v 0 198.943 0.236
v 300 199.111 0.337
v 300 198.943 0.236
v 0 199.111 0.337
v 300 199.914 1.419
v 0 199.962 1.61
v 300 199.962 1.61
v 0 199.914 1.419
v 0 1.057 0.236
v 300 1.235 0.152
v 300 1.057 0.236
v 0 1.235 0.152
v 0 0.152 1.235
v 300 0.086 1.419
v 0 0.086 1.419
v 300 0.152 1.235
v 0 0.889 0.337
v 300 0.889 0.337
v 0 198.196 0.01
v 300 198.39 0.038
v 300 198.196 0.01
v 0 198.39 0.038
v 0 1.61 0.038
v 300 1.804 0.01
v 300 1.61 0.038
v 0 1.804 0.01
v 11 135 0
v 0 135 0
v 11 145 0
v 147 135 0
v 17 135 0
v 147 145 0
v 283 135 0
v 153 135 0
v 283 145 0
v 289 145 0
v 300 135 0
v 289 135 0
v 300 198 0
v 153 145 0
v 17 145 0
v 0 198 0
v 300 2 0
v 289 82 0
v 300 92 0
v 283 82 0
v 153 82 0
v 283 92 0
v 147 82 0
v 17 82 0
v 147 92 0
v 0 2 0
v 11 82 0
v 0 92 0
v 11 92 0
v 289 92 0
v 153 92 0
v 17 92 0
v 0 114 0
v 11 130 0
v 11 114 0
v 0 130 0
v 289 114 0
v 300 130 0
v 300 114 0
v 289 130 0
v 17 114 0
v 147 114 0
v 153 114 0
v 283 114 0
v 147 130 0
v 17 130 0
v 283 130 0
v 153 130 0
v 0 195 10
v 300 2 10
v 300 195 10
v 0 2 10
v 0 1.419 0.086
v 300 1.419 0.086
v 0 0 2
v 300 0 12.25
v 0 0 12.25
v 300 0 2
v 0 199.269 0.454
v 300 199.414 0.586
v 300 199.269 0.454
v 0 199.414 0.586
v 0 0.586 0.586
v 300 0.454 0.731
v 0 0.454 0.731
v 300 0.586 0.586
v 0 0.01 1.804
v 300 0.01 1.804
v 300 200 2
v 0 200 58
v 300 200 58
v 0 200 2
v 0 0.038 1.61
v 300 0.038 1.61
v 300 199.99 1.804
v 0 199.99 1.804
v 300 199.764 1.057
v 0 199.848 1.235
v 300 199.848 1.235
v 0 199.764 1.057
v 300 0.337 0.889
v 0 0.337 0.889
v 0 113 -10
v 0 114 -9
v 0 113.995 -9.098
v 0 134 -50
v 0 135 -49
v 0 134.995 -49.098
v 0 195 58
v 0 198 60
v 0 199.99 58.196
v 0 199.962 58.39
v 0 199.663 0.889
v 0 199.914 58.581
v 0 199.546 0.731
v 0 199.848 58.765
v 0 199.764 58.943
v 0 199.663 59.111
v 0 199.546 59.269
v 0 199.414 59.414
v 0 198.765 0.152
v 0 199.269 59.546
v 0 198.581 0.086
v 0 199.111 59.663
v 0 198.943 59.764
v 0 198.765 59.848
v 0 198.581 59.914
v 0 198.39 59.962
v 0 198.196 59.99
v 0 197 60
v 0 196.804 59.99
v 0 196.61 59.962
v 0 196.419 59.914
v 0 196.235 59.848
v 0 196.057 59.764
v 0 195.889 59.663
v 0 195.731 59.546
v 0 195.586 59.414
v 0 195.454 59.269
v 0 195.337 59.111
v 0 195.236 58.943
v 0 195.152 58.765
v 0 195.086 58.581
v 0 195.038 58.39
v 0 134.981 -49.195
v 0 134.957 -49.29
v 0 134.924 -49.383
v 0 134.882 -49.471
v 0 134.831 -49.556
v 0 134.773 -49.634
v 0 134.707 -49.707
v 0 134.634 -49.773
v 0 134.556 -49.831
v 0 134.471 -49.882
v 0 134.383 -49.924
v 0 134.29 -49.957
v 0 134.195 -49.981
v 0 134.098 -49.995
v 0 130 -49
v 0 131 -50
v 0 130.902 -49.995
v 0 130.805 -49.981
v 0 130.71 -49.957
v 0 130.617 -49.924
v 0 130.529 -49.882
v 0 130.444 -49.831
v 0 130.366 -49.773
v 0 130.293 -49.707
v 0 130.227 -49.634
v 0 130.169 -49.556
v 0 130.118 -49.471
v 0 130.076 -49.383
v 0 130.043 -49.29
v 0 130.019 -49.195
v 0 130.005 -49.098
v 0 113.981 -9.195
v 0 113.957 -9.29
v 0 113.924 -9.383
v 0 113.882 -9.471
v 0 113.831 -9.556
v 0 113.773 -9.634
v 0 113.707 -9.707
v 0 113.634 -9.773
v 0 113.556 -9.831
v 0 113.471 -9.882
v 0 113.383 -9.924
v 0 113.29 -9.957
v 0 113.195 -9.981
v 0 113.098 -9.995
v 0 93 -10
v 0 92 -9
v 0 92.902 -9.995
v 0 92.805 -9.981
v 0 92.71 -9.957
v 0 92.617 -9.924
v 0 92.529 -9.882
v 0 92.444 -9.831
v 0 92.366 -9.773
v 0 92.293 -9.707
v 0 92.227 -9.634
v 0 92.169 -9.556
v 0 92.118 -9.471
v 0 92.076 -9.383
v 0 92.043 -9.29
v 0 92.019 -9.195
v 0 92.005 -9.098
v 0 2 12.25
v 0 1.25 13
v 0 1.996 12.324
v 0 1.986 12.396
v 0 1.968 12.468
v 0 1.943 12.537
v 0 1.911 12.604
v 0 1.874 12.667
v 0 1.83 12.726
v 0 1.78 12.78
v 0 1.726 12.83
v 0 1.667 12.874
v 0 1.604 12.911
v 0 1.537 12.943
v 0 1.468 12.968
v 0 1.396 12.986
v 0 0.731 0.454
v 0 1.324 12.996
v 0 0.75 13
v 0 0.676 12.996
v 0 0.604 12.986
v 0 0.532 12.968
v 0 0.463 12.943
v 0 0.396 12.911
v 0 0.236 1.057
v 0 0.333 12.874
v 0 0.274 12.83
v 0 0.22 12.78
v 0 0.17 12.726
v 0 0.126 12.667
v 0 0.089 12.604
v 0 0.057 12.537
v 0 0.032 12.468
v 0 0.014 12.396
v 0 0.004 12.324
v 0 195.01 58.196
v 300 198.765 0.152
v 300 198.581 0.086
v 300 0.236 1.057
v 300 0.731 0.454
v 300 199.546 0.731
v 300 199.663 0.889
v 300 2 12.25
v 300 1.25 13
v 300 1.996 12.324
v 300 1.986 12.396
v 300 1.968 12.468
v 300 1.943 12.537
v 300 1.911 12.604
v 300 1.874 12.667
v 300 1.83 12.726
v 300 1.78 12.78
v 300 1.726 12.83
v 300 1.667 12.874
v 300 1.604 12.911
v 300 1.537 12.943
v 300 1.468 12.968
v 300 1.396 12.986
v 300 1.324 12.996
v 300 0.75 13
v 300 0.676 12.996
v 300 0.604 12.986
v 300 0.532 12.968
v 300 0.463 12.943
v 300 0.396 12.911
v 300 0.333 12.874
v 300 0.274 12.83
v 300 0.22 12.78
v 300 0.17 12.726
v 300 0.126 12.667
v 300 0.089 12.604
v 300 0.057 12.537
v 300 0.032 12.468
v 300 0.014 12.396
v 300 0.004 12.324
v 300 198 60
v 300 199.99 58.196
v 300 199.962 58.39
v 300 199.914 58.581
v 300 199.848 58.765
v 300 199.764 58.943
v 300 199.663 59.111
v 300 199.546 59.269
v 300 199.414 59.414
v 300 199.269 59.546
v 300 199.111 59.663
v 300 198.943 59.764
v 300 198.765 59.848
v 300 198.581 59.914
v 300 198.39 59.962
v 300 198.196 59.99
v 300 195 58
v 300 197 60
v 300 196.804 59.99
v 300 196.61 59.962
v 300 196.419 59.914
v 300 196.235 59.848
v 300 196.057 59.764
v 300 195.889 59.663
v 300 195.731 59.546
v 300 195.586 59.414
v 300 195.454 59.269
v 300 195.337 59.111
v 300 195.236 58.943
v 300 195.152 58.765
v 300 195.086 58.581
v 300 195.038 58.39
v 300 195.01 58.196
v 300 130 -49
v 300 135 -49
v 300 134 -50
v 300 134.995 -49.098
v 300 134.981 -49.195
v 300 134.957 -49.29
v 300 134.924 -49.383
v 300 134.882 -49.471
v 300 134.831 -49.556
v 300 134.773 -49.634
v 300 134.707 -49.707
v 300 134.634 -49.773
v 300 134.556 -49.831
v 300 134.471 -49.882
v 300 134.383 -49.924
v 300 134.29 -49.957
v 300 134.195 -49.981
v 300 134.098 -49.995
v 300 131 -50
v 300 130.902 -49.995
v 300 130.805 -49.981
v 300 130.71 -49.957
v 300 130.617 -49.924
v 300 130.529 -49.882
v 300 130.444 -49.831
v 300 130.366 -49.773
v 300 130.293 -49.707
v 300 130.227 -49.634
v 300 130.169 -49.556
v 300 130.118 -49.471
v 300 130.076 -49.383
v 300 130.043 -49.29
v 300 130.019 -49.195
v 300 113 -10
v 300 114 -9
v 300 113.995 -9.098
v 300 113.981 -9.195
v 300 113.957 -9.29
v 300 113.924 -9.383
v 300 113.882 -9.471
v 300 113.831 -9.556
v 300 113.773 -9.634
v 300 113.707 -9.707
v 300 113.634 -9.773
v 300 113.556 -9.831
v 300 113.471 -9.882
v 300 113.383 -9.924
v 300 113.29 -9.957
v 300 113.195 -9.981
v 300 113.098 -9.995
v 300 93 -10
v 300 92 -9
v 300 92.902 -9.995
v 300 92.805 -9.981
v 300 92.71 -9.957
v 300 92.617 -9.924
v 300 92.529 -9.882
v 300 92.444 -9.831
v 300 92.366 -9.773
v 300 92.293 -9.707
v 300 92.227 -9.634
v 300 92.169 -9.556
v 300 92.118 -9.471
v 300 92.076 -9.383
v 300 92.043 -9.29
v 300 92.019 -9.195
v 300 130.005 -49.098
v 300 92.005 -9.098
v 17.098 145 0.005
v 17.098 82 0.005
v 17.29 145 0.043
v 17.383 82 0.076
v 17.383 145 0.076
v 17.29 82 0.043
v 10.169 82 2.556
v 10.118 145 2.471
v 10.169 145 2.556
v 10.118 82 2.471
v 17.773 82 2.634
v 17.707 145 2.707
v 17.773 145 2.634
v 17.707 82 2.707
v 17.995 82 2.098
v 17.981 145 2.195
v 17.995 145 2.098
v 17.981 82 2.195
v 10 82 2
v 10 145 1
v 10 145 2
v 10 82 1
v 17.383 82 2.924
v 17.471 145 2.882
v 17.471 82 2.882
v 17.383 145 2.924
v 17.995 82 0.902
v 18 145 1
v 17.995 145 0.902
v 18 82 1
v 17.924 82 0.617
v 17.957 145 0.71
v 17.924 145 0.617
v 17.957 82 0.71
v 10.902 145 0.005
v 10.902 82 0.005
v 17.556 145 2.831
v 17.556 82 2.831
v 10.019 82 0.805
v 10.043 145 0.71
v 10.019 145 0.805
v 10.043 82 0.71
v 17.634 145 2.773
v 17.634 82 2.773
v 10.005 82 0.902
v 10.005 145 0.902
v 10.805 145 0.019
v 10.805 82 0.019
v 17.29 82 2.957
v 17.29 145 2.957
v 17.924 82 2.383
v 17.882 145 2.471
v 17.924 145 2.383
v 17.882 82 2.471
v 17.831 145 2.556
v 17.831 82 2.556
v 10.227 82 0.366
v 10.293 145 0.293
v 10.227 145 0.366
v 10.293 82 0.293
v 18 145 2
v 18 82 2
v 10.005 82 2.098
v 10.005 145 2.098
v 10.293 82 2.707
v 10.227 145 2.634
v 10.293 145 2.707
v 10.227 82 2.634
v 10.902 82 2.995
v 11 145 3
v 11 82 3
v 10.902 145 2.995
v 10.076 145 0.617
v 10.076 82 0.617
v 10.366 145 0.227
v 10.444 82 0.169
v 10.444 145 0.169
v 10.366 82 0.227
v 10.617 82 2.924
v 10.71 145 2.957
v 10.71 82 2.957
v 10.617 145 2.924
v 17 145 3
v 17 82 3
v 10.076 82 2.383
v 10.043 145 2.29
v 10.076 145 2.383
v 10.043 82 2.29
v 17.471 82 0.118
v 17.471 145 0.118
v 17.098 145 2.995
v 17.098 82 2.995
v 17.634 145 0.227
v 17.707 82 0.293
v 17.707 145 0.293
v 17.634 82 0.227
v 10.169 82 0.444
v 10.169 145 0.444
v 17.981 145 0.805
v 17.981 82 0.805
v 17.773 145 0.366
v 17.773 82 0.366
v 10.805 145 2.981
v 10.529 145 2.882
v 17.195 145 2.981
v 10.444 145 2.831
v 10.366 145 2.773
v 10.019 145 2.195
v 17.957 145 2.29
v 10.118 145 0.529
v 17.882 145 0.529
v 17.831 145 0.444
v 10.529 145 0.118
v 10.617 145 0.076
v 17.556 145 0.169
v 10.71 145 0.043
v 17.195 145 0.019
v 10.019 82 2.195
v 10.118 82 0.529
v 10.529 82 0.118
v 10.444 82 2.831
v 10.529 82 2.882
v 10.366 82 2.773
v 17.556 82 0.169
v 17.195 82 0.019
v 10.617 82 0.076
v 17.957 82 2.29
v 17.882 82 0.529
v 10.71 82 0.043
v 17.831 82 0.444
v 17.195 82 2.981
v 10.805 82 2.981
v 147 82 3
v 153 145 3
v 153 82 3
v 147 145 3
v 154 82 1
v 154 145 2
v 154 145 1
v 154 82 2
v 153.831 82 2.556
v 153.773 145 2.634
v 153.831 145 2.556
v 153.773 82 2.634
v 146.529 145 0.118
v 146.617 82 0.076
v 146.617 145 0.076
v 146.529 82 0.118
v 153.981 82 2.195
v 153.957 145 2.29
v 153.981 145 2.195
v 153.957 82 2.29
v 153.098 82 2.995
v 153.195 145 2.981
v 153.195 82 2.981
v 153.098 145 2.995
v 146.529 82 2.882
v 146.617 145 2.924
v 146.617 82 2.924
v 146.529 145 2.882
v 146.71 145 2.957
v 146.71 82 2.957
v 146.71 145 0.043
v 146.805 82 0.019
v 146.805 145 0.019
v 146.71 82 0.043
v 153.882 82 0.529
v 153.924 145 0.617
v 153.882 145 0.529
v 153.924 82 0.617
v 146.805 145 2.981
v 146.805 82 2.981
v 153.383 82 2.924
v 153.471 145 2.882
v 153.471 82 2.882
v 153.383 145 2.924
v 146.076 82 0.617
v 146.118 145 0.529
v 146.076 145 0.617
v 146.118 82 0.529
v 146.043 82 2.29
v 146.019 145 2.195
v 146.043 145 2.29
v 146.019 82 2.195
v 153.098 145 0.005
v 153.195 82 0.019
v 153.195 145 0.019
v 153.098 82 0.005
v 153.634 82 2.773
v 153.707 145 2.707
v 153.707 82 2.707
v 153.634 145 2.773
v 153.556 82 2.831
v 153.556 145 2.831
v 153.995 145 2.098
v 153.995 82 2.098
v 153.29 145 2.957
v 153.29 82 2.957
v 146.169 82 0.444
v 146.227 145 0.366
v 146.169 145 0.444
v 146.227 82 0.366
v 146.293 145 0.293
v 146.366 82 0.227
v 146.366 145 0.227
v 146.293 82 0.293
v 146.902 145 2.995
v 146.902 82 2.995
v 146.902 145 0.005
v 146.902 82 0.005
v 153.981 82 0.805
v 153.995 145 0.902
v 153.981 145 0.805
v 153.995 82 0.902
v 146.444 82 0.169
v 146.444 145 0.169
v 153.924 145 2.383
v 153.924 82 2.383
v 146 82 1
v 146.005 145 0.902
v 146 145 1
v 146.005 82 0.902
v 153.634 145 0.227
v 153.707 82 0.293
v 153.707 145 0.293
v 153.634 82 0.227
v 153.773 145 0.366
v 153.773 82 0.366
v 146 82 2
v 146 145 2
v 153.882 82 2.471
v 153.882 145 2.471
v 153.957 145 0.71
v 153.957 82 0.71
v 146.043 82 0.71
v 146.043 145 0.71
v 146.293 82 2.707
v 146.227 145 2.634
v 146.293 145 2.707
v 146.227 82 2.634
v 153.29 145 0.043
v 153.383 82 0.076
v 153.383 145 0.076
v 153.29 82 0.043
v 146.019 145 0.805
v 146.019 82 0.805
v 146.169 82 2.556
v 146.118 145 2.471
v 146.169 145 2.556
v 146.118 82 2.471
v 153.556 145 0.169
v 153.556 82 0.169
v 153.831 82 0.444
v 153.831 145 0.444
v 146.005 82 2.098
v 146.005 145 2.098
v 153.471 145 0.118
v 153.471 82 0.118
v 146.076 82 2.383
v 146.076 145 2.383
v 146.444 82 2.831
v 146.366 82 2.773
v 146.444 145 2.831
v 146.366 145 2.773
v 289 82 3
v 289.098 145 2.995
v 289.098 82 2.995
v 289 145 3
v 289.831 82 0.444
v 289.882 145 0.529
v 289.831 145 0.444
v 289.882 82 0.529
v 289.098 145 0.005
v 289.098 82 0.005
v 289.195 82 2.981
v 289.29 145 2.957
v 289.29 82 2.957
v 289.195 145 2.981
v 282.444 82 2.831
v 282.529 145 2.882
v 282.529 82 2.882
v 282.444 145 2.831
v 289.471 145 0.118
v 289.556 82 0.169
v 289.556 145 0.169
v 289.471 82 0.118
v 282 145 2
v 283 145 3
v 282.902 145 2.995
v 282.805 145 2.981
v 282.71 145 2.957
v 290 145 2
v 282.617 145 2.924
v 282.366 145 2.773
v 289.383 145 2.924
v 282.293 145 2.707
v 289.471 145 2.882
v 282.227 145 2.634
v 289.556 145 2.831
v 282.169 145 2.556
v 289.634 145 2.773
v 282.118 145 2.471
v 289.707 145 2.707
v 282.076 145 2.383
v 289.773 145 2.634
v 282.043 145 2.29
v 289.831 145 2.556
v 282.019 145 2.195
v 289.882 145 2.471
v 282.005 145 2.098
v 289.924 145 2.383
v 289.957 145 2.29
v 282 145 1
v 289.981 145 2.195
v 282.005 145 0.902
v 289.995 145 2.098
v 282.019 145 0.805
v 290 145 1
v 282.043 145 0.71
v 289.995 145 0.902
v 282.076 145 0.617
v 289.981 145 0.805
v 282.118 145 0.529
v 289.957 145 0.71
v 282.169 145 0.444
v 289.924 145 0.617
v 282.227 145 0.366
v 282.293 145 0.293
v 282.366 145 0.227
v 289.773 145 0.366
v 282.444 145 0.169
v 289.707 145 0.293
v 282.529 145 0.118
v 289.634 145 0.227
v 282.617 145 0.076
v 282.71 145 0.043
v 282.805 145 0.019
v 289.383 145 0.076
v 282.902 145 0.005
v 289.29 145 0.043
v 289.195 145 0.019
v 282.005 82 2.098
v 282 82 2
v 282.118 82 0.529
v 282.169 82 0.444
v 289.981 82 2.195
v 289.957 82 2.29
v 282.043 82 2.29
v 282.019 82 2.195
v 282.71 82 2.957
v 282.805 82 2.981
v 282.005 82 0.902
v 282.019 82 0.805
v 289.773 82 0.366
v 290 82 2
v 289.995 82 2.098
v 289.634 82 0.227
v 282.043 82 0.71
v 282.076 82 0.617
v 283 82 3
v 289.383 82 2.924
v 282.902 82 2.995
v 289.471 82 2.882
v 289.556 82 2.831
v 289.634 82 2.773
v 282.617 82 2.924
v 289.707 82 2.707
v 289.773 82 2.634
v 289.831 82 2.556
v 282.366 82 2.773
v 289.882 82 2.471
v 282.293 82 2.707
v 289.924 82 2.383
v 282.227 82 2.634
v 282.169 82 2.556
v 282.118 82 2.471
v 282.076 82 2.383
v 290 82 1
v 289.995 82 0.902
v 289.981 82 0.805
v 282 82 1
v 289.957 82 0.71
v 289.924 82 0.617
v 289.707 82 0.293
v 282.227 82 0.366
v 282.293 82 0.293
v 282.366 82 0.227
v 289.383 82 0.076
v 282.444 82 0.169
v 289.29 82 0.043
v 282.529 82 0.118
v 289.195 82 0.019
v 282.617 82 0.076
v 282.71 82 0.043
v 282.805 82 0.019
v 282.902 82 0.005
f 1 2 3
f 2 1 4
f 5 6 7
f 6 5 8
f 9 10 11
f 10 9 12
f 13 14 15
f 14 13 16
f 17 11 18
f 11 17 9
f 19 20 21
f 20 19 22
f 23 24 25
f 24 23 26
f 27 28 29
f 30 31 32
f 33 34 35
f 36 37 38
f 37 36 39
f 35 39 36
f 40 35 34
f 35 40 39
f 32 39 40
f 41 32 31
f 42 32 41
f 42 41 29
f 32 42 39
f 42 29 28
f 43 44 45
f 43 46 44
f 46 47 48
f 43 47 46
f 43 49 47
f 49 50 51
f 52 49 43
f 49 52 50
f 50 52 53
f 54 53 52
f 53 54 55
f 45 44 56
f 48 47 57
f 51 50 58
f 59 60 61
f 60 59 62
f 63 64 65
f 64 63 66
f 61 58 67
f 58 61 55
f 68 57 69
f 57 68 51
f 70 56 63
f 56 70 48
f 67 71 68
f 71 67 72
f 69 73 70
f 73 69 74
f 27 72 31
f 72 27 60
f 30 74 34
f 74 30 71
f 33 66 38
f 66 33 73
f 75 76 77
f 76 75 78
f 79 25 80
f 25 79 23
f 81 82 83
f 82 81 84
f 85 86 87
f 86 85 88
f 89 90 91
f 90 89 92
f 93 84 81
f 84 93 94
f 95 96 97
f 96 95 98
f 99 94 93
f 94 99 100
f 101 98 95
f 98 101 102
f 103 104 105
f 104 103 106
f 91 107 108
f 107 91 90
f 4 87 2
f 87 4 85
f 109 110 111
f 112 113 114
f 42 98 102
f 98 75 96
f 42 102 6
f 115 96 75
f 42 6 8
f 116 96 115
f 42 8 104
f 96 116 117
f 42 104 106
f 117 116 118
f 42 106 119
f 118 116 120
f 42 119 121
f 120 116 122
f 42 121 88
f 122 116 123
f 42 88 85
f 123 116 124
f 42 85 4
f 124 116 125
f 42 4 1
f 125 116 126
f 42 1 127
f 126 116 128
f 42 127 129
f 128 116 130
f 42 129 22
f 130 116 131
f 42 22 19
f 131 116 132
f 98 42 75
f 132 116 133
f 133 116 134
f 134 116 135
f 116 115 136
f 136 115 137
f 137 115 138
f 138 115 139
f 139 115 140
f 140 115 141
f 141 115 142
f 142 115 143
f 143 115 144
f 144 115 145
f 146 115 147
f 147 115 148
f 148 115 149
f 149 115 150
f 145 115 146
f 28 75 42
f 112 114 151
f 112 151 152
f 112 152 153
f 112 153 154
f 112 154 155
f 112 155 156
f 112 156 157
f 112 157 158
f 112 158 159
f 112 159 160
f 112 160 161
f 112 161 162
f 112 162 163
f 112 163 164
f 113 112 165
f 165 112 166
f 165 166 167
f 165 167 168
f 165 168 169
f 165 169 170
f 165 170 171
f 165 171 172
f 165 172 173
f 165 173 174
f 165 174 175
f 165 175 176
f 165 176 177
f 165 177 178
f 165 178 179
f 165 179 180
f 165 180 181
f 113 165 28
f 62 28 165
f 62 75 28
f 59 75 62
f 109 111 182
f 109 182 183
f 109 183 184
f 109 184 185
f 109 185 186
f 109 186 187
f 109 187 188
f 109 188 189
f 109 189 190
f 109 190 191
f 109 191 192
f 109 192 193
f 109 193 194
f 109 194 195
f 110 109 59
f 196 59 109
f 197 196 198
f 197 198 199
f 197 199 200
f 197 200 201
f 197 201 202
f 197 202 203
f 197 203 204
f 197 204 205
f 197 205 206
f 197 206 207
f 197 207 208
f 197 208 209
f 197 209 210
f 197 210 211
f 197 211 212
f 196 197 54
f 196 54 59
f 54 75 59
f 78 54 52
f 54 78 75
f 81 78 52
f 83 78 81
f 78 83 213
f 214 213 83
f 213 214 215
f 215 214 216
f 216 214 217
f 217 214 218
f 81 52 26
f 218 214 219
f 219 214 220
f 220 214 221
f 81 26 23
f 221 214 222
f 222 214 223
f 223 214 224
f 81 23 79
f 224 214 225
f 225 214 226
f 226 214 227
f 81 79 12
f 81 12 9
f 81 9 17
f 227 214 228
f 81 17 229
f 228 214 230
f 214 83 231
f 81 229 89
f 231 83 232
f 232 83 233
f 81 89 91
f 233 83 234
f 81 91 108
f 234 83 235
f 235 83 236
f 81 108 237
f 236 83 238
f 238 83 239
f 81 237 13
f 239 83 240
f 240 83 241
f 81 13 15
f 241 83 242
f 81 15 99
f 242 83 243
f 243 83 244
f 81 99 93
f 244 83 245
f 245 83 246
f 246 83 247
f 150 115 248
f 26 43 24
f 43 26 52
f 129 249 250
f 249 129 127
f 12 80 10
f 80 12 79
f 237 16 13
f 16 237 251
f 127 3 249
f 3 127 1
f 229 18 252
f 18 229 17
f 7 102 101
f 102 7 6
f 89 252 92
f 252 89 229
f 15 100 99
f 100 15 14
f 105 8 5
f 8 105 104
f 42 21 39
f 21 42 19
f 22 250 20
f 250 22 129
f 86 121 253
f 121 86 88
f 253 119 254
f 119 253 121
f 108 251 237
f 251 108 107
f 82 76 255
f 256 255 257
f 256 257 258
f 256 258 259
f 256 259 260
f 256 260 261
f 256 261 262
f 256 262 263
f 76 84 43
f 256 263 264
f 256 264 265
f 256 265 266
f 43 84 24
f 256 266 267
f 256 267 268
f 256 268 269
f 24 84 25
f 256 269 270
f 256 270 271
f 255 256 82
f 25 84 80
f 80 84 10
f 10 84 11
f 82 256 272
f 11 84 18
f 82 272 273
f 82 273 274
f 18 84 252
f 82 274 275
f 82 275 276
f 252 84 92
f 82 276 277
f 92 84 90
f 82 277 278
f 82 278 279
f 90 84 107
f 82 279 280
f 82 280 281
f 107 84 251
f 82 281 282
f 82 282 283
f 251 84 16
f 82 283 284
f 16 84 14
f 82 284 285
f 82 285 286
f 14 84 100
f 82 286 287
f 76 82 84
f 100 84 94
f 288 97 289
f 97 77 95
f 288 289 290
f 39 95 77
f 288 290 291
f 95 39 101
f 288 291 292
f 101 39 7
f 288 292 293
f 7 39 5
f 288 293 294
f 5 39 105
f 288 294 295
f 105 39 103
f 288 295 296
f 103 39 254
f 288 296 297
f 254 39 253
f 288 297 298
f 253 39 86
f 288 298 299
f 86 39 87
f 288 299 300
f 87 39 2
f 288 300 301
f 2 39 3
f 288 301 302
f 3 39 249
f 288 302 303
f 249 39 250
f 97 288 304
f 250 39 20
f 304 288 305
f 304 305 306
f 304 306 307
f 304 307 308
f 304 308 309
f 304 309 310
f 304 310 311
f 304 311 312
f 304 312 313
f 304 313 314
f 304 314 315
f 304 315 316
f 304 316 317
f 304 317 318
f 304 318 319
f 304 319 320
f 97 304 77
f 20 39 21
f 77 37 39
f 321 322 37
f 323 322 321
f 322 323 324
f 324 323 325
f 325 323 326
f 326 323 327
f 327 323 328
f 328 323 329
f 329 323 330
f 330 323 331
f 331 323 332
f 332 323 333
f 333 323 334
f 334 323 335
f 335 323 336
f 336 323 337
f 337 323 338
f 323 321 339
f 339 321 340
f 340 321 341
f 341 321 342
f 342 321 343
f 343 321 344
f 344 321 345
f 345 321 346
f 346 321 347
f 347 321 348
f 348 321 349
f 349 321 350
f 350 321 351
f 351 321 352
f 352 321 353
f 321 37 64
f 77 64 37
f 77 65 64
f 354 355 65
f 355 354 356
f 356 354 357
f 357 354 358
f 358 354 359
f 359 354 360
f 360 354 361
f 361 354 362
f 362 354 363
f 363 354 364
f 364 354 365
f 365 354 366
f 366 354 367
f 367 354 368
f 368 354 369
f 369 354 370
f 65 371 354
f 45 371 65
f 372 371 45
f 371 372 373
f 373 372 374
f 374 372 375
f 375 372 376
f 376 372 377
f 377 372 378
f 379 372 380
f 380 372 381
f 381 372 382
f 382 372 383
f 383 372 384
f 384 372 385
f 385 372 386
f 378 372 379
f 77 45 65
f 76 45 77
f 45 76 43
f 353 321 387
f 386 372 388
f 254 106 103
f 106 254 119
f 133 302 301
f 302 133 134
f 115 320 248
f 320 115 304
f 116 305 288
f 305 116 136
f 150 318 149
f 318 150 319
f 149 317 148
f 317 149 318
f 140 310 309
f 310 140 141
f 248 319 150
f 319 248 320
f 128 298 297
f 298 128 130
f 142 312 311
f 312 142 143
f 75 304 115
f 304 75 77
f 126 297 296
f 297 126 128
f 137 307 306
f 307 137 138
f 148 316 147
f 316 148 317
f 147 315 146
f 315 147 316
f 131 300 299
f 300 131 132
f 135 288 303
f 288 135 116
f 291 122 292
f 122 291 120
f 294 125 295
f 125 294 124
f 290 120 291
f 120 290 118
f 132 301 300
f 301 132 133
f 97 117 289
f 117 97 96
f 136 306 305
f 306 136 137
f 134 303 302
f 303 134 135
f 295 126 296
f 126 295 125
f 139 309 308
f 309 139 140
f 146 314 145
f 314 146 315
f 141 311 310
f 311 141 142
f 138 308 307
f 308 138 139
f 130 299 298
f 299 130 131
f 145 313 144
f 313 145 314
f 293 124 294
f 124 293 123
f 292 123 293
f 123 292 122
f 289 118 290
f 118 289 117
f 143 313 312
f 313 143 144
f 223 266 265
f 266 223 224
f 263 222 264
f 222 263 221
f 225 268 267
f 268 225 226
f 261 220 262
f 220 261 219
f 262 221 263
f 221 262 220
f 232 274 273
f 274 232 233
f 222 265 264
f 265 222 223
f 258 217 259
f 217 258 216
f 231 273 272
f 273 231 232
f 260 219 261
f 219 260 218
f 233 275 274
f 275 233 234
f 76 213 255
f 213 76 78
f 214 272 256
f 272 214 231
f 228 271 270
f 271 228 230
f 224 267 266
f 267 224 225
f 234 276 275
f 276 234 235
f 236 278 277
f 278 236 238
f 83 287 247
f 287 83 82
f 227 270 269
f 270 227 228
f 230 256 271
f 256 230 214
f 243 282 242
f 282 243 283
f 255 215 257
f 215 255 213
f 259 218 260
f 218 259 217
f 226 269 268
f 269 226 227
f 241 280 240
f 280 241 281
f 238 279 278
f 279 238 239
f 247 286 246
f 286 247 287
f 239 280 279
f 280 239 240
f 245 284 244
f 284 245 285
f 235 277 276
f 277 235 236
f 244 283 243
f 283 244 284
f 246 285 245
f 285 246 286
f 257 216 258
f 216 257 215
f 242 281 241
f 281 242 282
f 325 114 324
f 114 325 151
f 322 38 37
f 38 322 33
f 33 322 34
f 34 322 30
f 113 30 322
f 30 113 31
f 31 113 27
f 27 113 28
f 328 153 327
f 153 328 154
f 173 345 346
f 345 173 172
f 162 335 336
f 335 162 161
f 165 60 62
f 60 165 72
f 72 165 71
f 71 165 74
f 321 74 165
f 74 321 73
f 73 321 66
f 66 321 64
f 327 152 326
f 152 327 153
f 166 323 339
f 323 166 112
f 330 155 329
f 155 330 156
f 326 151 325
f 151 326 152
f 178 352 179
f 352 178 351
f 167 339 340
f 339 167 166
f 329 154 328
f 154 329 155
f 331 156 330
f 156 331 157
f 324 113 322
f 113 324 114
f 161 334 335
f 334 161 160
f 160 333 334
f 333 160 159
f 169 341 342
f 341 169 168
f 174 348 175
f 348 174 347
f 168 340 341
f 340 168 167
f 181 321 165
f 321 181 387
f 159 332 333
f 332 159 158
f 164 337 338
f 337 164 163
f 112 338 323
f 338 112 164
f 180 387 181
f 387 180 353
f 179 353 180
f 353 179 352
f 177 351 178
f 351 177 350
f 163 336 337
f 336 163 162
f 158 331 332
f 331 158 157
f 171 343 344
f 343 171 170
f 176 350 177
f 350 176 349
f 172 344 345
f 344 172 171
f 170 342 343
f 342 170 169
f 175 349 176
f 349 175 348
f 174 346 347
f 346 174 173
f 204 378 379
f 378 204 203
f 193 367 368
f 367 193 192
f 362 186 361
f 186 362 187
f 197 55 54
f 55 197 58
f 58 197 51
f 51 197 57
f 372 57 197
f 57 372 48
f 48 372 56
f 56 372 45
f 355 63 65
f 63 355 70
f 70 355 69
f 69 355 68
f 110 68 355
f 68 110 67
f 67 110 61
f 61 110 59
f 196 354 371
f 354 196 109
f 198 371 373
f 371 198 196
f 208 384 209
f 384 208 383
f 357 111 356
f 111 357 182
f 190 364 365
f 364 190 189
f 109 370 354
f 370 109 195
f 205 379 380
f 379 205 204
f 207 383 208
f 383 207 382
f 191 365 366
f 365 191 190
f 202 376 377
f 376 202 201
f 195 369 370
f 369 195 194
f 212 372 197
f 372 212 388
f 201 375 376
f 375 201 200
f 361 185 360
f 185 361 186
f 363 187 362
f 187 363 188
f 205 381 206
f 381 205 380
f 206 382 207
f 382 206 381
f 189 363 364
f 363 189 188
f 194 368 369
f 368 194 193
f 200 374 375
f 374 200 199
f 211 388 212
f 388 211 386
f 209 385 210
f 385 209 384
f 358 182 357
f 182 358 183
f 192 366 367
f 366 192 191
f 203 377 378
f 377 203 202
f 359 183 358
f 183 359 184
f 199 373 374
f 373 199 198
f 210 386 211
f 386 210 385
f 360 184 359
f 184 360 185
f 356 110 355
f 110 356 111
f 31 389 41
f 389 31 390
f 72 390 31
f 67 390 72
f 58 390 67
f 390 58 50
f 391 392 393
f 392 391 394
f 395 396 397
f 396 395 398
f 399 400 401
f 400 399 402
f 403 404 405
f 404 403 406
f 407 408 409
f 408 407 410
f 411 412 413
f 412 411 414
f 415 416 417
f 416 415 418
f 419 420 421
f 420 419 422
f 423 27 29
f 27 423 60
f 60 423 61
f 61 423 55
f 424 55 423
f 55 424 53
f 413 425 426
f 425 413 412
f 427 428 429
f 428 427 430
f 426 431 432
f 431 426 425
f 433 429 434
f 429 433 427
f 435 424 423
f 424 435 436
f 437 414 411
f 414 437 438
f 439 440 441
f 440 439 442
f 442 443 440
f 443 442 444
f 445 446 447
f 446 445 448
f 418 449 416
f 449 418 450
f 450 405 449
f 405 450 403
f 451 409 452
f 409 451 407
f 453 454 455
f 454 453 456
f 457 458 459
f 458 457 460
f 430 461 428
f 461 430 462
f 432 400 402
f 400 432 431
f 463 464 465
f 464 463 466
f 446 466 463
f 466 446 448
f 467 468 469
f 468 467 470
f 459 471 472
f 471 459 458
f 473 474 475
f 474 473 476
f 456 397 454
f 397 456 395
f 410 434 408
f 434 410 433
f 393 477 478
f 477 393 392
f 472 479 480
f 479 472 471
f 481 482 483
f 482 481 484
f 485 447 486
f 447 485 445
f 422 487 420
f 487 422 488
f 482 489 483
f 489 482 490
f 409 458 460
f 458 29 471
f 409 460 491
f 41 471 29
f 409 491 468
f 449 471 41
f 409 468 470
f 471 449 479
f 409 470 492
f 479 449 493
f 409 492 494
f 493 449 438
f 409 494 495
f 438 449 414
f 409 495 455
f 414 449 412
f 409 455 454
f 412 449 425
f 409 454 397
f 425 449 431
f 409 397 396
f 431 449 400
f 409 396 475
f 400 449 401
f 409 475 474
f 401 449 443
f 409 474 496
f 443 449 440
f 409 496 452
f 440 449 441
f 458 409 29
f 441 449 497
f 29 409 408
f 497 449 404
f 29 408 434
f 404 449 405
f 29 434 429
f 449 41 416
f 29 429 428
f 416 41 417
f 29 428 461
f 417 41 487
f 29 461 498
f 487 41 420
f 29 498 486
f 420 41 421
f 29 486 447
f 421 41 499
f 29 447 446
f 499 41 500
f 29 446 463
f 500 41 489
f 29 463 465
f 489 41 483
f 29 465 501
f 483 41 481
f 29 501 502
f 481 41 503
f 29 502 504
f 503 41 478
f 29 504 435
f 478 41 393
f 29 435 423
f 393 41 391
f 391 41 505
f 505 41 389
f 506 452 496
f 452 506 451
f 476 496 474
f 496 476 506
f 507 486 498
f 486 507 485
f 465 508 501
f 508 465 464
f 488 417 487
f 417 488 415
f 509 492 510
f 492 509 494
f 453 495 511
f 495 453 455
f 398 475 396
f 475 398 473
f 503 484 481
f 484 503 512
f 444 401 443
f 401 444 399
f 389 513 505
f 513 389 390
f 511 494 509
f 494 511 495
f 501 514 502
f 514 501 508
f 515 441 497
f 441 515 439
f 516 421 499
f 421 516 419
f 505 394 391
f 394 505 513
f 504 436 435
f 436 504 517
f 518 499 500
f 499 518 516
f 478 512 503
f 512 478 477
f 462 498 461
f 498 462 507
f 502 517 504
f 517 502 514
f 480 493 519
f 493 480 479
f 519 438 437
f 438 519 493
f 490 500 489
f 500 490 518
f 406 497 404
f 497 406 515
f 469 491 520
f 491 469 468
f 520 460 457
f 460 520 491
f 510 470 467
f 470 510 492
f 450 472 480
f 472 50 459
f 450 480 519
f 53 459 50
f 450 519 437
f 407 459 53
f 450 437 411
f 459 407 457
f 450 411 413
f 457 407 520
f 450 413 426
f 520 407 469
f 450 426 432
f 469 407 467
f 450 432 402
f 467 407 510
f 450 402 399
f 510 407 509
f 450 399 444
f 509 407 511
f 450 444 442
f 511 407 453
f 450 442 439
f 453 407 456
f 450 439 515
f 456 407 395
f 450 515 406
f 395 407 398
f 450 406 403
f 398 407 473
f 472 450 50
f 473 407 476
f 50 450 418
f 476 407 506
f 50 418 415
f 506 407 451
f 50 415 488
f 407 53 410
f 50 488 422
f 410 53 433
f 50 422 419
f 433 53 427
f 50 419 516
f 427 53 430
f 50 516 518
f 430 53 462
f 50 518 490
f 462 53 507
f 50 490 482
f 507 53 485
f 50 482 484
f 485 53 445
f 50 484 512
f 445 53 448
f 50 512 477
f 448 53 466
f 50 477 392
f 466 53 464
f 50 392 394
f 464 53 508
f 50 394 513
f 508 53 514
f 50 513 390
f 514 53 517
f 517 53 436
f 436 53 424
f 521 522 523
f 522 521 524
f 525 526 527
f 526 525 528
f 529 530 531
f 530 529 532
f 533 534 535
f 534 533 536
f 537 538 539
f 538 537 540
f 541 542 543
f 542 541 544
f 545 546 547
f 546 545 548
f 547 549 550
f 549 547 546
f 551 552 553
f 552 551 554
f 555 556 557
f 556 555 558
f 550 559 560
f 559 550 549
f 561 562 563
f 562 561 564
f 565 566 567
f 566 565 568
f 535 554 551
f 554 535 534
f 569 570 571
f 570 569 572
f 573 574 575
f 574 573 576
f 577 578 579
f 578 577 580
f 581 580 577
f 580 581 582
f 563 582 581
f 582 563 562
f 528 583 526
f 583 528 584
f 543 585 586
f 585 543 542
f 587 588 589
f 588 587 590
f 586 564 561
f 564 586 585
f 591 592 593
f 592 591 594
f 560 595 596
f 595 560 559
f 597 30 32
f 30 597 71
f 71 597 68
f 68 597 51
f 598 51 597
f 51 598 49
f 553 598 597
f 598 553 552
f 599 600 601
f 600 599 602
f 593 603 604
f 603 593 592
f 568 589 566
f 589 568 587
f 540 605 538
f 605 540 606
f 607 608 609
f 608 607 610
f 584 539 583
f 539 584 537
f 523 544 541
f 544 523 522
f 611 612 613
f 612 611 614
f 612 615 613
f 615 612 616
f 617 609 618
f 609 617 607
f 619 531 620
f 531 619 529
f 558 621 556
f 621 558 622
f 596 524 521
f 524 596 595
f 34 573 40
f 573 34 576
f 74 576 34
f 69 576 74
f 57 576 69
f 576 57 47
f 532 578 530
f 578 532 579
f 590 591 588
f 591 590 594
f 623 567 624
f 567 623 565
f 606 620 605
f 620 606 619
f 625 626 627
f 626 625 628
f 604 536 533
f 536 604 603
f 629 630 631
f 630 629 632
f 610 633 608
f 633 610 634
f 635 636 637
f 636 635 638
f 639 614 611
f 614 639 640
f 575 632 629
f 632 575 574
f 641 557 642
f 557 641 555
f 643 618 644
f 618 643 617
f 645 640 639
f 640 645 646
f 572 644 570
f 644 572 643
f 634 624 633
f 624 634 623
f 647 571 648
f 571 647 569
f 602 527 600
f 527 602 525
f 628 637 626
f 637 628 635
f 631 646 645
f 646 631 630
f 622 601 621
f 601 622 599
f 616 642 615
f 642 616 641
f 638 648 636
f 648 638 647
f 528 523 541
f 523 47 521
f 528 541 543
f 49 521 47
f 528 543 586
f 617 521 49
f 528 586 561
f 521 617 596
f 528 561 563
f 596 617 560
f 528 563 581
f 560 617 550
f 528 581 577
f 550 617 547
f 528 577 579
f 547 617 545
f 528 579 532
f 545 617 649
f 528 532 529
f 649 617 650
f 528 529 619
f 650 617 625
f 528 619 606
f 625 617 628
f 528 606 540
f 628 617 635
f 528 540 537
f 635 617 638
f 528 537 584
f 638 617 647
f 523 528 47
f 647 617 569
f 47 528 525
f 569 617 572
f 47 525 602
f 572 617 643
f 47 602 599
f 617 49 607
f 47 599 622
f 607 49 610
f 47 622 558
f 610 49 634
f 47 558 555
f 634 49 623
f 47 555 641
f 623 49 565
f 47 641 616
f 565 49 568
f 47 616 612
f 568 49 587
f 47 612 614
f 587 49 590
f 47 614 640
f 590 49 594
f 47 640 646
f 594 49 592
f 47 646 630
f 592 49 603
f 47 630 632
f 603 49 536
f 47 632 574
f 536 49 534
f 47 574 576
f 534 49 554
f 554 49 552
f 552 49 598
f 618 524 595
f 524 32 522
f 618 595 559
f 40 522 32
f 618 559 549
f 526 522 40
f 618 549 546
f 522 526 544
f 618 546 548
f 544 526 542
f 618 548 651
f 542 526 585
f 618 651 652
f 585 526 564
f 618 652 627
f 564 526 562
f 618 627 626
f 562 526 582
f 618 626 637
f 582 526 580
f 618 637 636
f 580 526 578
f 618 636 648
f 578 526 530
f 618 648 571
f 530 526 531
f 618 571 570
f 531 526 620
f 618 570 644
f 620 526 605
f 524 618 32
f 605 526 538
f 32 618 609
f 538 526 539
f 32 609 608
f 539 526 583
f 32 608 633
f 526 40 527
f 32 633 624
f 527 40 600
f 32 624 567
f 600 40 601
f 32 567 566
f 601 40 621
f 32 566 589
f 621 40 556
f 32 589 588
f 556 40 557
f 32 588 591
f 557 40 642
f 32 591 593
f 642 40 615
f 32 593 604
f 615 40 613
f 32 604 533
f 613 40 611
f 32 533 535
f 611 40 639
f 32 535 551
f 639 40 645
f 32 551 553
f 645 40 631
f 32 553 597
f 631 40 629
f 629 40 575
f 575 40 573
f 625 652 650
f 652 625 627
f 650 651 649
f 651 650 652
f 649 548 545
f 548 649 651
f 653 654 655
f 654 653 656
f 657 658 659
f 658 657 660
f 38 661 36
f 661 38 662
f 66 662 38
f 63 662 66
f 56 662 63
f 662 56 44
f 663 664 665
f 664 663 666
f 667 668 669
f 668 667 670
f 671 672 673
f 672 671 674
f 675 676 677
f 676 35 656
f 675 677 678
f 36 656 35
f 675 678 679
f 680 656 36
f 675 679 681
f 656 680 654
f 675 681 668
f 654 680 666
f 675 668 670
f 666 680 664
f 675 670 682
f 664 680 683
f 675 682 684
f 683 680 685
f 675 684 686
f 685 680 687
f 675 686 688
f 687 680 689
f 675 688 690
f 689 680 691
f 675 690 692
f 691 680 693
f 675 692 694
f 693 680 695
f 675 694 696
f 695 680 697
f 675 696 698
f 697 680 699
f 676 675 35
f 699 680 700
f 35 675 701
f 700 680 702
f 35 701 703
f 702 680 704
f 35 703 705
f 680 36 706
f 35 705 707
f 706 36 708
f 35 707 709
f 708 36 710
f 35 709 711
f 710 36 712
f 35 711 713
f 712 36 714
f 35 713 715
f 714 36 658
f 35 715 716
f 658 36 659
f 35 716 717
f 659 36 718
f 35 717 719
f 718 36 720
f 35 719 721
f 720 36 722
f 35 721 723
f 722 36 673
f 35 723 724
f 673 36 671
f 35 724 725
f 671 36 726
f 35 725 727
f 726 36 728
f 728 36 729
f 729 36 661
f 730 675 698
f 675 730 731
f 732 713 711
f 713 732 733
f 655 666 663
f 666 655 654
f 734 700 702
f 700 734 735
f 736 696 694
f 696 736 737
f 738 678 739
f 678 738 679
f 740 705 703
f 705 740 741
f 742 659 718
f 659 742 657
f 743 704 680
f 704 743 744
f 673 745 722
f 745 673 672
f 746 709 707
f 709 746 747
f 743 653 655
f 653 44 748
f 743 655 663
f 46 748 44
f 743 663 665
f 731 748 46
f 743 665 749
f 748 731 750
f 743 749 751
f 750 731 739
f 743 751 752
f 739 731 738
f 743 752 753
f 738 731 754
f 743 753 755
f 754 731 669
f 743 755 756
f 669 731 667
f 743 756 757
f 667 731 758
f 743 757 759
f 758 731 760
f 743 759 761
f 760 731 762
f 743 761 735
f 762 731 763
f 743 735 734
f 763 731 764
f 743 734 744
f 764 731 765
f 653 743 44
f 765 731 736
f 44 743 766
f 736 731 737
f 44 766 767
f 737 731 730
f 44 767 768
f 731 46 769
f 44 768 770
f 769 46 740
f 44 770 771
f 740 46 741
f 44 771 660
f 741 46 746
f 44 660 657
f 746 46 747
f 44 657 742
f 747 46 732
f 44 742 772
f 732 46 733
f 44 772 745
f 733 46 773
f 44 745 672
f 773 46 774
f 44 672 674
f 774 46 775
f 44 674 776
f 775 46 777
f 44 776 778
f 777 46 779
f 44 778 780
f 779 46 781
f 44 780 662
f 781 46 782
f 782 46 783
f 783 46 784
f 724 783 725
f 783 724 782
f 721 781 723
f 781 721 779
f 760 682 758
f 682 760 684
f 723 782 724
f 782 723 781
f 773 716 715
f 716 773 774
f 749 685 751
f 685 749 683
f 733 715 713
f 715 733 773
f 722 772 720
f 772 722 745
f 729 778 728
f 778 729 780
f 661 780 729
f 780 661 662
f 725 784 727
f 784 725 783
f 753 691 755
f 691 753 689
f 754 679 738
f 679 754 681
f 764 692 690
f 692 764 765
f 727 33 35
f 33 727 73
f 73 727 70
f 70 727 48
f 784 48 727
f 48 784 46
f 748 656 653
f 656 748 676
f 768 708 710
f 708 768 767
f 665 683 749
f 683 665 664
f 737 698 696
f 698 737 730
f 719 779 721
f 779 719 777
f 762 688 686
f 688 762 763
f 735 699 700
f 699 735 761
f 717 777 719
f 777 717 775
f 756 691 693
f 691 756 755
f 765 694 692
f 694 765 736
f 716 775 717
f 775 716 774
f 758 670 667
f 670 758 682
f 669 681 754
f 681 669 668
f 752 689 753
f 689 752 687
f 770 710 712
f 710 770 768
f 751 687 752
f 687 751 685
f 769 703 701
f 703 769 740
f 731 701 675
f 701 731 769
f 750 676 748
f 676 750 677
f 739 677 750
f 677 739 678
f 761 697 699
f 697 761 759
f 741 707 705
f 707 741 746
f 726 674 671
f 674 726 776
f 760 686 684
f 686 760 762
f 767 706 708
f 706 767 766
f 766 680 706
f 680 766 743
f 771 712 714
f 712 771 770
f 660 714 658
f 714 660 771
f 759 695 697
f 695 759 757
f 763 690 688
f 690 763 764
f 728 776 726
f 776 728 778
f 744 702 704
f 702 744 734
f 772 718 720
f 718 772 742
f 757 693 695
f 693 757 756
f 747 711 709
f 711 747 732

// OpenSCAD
// 300mm-wide × 200mm-deep bar shelf — see bar_shelf.scad for the design.
shelf_width_override = 300;
shelf_depth_override = 200;
include <bar_shelf.scad>
